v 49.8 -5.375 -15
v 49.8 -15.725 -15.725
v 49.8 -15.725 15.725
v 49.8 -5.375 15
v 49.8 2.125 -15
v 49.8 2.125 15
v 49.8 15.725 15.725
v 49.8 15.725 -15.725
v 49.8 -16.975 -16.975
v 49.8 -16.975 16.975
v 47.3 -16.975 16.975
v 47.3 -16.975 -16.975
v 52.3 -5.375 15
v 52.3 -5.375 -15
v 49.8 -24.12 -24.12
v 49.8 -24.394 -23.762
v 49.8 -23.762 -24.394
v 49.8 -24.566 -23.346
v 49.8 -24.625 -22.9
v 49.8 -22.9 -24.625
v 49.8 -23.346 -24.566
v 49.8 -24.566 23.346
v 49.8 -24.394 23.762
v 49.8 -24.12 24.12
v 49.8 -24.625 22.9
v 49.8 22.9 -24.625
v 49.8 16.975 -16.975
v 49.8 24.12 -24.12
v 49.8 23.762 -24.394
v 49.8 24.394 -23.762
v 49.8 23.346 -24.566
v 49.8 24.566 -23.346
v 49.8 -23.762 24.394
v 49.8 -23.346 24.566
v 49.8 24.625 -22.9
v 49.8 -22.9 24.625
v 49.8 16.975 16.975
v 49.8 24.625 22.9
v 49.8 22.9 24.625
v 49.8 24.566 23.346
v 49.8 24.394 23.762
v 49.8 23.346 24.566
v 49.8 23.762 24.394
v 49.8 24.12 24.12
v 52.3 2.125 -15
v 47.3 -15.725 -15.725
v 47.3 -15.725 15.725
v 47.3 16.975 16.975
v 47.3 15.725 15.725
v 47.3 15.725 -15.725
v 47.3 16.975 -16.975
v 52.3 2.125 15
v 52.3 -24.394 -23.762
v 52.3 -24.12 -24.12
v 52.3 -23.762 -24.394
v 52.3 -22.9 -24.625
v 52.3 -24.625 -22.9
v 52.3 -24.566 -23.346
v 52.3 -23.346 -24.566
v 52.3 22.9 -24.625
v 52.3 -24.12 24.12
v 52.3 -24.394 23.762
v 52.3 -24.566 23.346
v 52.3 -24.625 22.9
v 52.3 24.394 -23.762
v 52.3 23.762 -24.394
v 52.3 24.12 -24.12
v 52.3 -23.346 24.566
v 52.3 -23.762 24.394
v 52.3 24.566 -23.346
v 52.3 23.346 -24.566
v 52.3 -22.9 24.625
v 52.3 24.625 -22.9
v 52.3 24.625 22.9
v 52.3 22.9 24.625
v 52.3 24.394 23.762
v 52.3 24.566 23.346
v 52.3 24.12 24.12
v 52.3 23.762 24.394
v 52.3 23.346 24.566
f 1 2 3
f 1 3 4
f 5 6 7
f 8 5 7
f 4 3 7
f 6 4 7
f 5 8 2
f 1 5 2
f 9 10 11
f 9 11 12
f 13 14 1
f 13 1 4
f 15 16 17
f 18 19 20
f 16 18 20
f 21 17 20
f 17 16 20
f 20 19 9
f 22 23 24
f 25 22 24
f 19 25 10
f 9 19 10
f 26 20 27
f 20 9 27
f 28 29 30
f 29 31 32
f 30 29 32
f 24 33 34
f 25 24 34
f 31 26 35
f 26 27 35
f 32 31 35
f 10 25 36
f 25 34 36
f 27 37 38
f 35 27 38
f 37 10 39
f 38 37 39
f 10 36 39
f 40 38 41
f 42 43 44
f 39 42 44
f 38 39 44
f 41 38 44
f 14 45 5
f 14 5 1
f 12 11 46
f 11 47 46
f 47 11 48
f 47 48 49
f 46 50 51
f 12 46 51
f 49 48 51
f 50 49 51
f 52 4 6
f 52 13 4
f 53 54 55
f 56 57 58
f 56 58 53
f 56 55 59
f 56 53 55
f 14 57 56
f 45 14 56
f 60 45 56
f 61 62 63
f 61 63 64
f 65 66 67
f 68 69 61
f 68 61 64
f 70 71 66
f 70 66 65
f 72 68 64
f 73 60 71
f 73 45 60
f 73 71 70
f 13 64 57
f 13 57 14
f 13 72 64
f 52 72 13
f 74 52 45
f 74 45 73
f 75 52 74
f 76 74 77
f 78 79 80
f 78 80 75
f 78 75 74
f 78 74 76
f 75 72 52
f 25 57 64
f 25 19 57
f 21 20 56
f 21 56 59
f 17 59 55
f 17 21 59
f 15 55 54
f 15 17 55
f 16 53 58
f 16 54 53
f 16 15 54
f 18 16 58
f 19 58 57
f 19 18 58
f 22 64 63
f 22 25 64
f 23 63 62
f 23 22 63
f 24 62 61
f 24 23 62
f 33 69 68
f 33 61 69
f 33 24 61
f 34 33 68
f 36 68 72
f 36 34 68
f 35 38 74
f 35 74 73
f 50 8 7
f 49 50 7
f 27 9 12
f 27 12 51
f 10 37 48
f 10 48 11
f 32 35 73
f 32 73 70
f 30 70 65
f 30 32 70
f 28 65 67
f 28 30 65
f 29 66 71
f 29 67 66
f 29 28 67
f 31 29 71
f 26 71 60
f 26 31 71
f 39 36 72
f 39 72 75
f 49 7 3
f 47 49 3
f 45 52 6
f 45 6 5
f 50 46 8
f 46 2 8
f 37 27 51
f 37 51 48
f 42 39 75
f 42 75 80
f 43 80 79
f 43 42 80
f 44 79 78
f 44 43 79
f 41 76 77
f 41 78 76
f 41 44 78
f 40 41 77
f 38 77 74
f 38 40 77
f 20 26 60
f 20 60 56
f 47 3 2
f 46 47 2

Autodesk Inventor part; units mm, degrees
ref_plane "YZ Plane" through (0, 0, 0) normal (1, 0, 0) x (0, 1, 0)
ref_plane "XZ Plane" through (0, 0, 0) normal (0, 1, 0) x (-1, 0, 0)
sketch "Sketch1" plane through (0, 0, 0) normal (1, 0, 0) x (0, 1, 0)
  spline S0 degree 2 poles (3.4234, 22.1338) (3.5939, 22.0177) (3.7865, 21.6596) (3.7865, 21.4052) knots 0 0 0 1 2 2 2 projected
  spline S1 degree 2 poles (3.7865, 21.4052) (3.7865, 21.2076) (3.6457, 20.8519) (3.5198, 20.7284) knots 0 0 0 1 2 2 2 projected
  spline S2 degree 2 poles (3.5198, 20.7284) (3.3617, 20.5728) (2.9344, 20.4122) (2.6083, 20.4122) knots 0 0 0 1 2 2 2 projected
  line L0 (2.6083, 20.4122) -> (2.265, 20.4122) projected
  line L1 (2.265, 20.4122) -> (2.265, 19.276) projected
  line L2 (2.265, 19.276) -> (1.8599, 19.276) projected
  line L3 (1.8599, 19.276) -> (1.8599, 22.324) projected
  line L4 (1.8599, 22.324) -> (2.6256, 22.324) projected
  spline S3 degree 2 poles (2.6256, 22.324) (2.8973, 22.324) (3.2777, 22.2351) (3.4234, 22.1338) knots 0 0 0 1 2 2 2 projected
  spline S4 degree 2 poles (0.0667, 22.3882) (0.3779, 22.3882) (0.8769, 22.1709) (1.0498, 21.9757) knots 0 0 0 1 2 2 2 projected
  spline S5 degree 2 poles (1.0498, 21.9757) (1.2227, 21.7732) (1.4153, 21.1804) (1.4153, 20.8) knots 0 0 0 1 2 2 2 projected
  spline S6 degree 2 poles (1.4153, 20.8) (1.4153, 20.4295) (1.2276, 19.8293) (1.0498, 19.6267) knots 0 0 0 1 2 2 2 projected
  spline S7 degree 2 poles (1.0498, 19.6267) (0.862, 19.4143) (0.3656, 19.2118) (0.0667, 19.2118) knots 0 0 0 1 2 2 2 projected
  spline S8 degree 2 poles (0.0667, 19.2118) (-0.2421, 19.2118) (-0.7361, 19.4217) (-0.9164, 19.6267) knots 0 0 0 1 2 2 2 projected
  spline S9 degree 2 poles (-0.9164, 19.6267) (-1.0917, 19.8293) (-1.2795, 20.4246) (-1.2795, 20.8) knots 0 0 0 1 2 2 2 projected
  spline S10 degree 2 poles (-1.2795, 20.8) (-1.2795, 21.1829) (-1.0893, 21.7658) (-0.9139, 21.9757) knots 0 0 0 1 2 2 2 projected
  spline S11 degree 2 poles (-0.9139, 21.9757) (-0.7361, 22.1783) (-0.2396, 22.3882) (0.0667, 22.3882) knots 0 0 0 1 2 2 2 projected
  line L5 (-2.4379, 19.276) -> (-2.843, 19.276) projected
  line L6 (-2.843, 19.276) -> (-2.843, 21.9634) projected
  line L7 (-2.843, 21.9634) -> (-3.8656, 21.9634) projected
  line L8 (-3.8656, 21.9634) -> (-3.8656, 22.324) projected
  line L9 (-3.8656, 22.324) -> (-1.4153, 22.324) projected
  line L10 (-1.4153, 22.324) -> (-1.4153, 21.9634) projected
  line L11 (-1.4153, 21.9634) -> (-2.4379, 21.9634) projected
  line L12 (-2.4379, 21.9634) -> (-2.4379, 19.276) projected
  spline S12 degree 2 poles (22.1338, -3.4234) (22.0177, -3.5939) (21.6596, -3.7865) (21.4052, -3.7865) knots 0 0 0 1 2 2 2 projected
  spline S13 degree 2 poles (21.4052, -3.7865) (21.2076, -3.7865) (20.8519, -3.6457) (20.7284, -3.5198) knots 0 0 0 1 2 2 2 projected
  spline S14 degree 2 poles (20.7284, -3.5198) (20.5728, -3.3617) (20.4122, -2.9344) (20.4122, -2.6083) knots 0 0 0 1 2 2 2 projected
  line L13 (20.4122, -2.6083) -> (20.4122, -2.265) projected
  line L14 (20.4122, -2.265) -> (19.276, -2.265) projected
  line L15 (19.276, -2.265) -> (19.276, -1.8599) projected
  line L16 (19.276, -1.8599) -> (22.324, -1.8599) projected
  line L17 (22.324, -1.8599) -> (22.324, -2.6256) projected
  spline S15 degree 2 poles (22.324, -2.6256) (22.324, -2.8973) (22.2351, -3.2777) (22.1338, -3.4234) knots 0 0 0 1 2 2 2 projected
  spline S16 degree 2 poles (22.3882, -0.0667) (22.3882, -0.3779) (22.1709, -0.8769) (21.9757, -1.0498) knots 0 0 0 1 2 2 2 projected
  spline S17 degree 2 poles (21.9757, -1.0498) (21.7732, -1.2227) (21.1804, -1.4153) (20.8, -1.4153) knots 0 0 0 1 2 2 2 projected
  spline S18 degree 2 poles (20.8, -1.4153) (20.4295, -1.4153) (19.8293, -1.2276) (19.6267, -1.0498) knots 0 0 0 1 2 2 2 projected
  spline S19 degree 2 poles (19.6267, -1.0498) (19.4143, -0.862) (19.2118, -0.3656) (19.2118, -0.0667) knots 0 0 0 1 2 2 2 projected
  spline S20 degree 2 poles (19.2118, -0.0667) (19.2118, 0.2421) (19.4217, 0.7361) (19.6267, 0.9164) knots 0 0 0 1 2 2 2 projected
  spline S21 degree 2 poles (19.6267, 0.9164) (19.8293, 1.0917) (20.4246, 1.2795) (20.8, 1.2795) knots 0 0 0 1 2 2 2 projected
  spline S22 degree 2 poles (20.8, 1.2795) (21.1829, 1.2795) (21.7658, 1.0893) (21.9757, 0.9139) knots 0 0 0 1 2 2 2 projected
  spline S23 degree 2 poles (21.9757, 0.9139) (22.1783, 0.7361) (22.3882, 0.2396) (22.3882, -0.0667) knots 0 0 0 1 2 2 2 projected
  line L18 (19.276, 2.4379) -> (19.276, 2.843) projected
  line L19 (19.276, 2.843) -> (21.9634, 2.843) projected
  line L20 (21.9634, 2.843) -> (21.9634, 3.8656) projected
  line L21 (21.9634, 3.8656) -> (22.324, 3.8656) projected
  line L22 (22.324, 3.8656) -> (22.324, 1.4153) projected
  line L23 (22.324, 1.4153) -> (21.9634, 1.4153) projected
  line L24 (21.9634, 1.4153) -> (21.9634, 2.4379) projected
  line L25 (21.9634, 2.4379) -> (19.276, 2.4379) projected
  spline S24 degree 2 poles (-3.4234, -22.1338) (-3.5939, -22.0177) (-3.7865, -21.6596) (-3.7865, -21.4052) knots 0 0 0 1 2 2 2 projected
  spline S25 degree 2 poles (-3.7865, -21.4052) (-3.7865, -21.2076) (-3.6457, -20.8519) (-3.5198, -20.7284) knots 0 0 0 1 2 2 2 projected
  spline S26 degree 2 poles (-3.5198, -20.7284) (-3.3617, -20.5728) (-2.9344, -20.4122) (-2.6083, -20.4122) knots 0 0 0 1 2 2 2 projected
  line L26 (-2.6083, -20.4122) -> (-2.265, -20.4122) projected
  line L27 (-2.265, -20.4122) -> (-2.265, -19.276) projected
  line L28 (-2.265, -19.276) -> (-1.8599, -19.276) projected
  line L29 (-1.8599, -19.276) -> (-1.8599, -22.324) projected
  line L30 (-1.8599, -22.324) -> (-2.6256, -22.324) projected
  spline S27 degree 2 poles (-2.6256, -22.324) (-2.8973, -22.324) (-3.2777, -22.2351) (-3.4234, -22.1338) knots 0 0 0 1 2 2 2 projected
  spline S28 degree 2 poles (-0.0667, -22.3882) (-0.3779, -22.3882) (-0.8769, -22.1709) (-1.0498, -21.9757) knots 0 0 0 1 2 2 2 projected
  spline S29 degree 2 poles (-1.0498, -21.9757) (-1.2227, -21.7732) (-1.4153, -21.1804) (-1.4153, -20.8) knots 0 0 0 1 2 2 2 projected
  spline S30 degree 2 poles (-1.4153, -20.8) (-1.4153, -20.4295) (-1.2276, -19.8293) (-1.0498, -19.6267) knots 0 0 0 1 2 2 2 projected
  spline S31 degree 2 poles (-1.0498, -19.6267) (-0.862, -19.4143) (-0.3656, -19.2118) (-0.0667, -19.2118) knots 0 0 0 1 2 2 2 projected
  spline S32 degree 2 poles (-0.0667, -19.2118) (0.2421, -19.2118) (0.7361, -19.4217) (0.9164, -19.6267) knots 0 0 0 1 2 2 2 projected
  spline S33 degree 2 poles (0.9164, -19.6267) (1.0917, -19.8293) (1.2795, -20.4246) (1.2795, -20.8) knots 0 0 0 1 2 2 2 projected
  spline S34 degree 2 poles (1.2795, -20.8) (1.2795, -21.1829) (1.0893, -21.7658) (0.9139, -21.9757) knots 0 0 0 1 2 2 2 projected
  spline S35 degree 2 poles (0.9139, -21.9757) (0.7361, -22.1783) (0.2396, -22.3882) (-0.0667, -22.3882) knots 0 0 0 1 2 2 2 projected
  line L31 (2.4379, -19.276) -> (2.843, -19.276) projected
  line L32 (2.843, -19.276) -> (2.843, -21.9634) projected
  line L33 (2.843, -21.9634) -> (3.8656, -21.9634) projected
  line L34 (3.8656, -21.9634) -> (3.8656, -22.324) projected
  line L35 (3.8656, -22.324) -> (1.4153, -22.324) projected
  line L36 (1.4153, -22.324) -> (1.4153, -21.9634) projected
  line L37 (1.4153, -21.9634) -> (2.4379, -21.9634) projected
  line L38 (2.4379, -21.9634) -> (2.4379, -19.276) projected
  spline S36 degree 2 poles (-22.1338, 3.4234) (-22.0177, 3.5939) (-21.6596, 3.7865) (-21.4052, 3.7865) knots 0 0 0 1 2 2 2 projected
  spline S37 degree 2 poles (-21.4052, 3.7865) (-21.2076, 3.7865) (-20.8519, 3.6457) (-20.7284, 3.5198) knots 0 0 0 1 2 2 2 projected
  spline S38 degree 2 poles (-20.7284, 3.5198) (-20.5728, 3.3617) (-20.4122, 2.9344) (-20.4122, 2.6083) knots 0 0 0 1 2 2 2 projected
  line L39 (-20.4122, 2.6083) -> (-20.4122, 2.265) projected
  line L40 (-20.4122, 2.265) -> (-19.276, 2.265) projected
  line L41 (-19.276, 2.265) -> (-19.276, 1.8599) projected
  line L42 (-19.276, 1.8599) -> (-22.324, 1.8599) projected
  line L43 (-22.324, 1.8599) -> (-22.324, 2.6256) projected
  spline S39 degree 2 poles (-22.324, 2.6256) (-22.324, 2.8973) (-22.2351, 3.2777) (-22.1338, 3.4234) knots 0 0 0 1 2 2 2 projected
  spline S40 degree 2 poles (-22.3882, 0.0667) (-22.3882, 0.3779) (-22.1709, 0.8769) (-21.9757, 1.0498) knots 0 0 0 1 2 2 2 projected
  spline S41 degree 2 poles (-21.9757, 1.0498) (-21.7732, 1.2227) (-21.1804, 1.4153) (-20.8, 1.4153) knots 0 0 0 1 2 2 2 projected
  spline S42 degree 2 poles (-20.8, 1.4153) (-20.4295, 1.4153) (-19.8293, 1.2276) (-19.6267, 1.0498) knots 0 0 0 1 2 2 2 projected
  spline S43 degree 2 poles (-19.6267, 1.0498) (-19.4143, 0.862) (-19.2118, 0.3656) (-19.2118, 0.0667) knots 0 0 0 1 2 2 2 projected
  spline S44 degree 2 poles (-19.2118, 0.0667) (-19.2118, -0.2421) (-19.4217, -0.7361) (-19.6267, -0.9164) knots 0 0 0 1 2 2 2 projected
  spline S45 degree 2 poles (-19.6267, -0.9164) (-19.8293, -1.0917) (-20.4246, -1.2795) (-20.8, -1.2795) knots 0 0 0 1 2 2 2 projected
  spline S46 degree 2 poles (-20.8, -1.2795) (-21.1829, -1.2795) (-21.7658, -1.0893) (-21.9757, -0.9139) knots 0 0 0 1 2 2 2 projected
  spline S47 degree 2 poles (-21.9757, -0.9139) (-22.1783, -0.7361) (-22.3882, -0.2396) (-22.3882, 0.0667) knots 0 0 0 1 2 2 2 projected
  line L44 (-19.276, -2.4379) -> (-19.276, -2.843) projected
  line L45 (-19.276, -2.843) -> (-21.9634, -2.843) projected
  line L46 (-21.9634, -2.843) -> (-21.9634, -3.8656) projected
  line L47 (-21.9634, -3.8656) -> (-22.324, -3.8656) projected
  line L48 (-22.324, -3.8656) -> (-22.324, -1.4153) projected
  line L49 (-22.324, -1.4153) -> (-21.9634, -1.4153) projected
  line L50 (-21.9634, -1.4153) -> (-21.9634, -2.4379) projected
  line L51 (-21.9634, -2.4379) -> (-19.276, -2.4379) projected
  circle A0 centre (-21.9, 21.9) radius 1.875 projected
  circle A1 centre (21.9, -21.9) radius 1.875 projected
  circle A2 centre (-21.9, -21.9) radius 1.875 projected
  circle A3 centre (21.9, 21.9) radius 1.875 projected
  circle A4 centre (20.8, -14.4) radius 2.0788 projected
  circle A5 centre (-20.8, 14.4) radius 2.0788 projected
  circle A6 centre (-20.8, -14.4) radius 2.0788 projected
  circle A7 centre (-14.4, -20.8) radius 2.0788 projected
  line L52 (17.05, 17.05) -> (-17.05, 17.05) projected
  line L53 (17.05, -17.05) -> (17.05, 17.05) projected
  line L54 (-17.05, -17.05) -> (17.05, -17.05) projected
  line L55 (-17.05, 17.05) -> (-17.05, -17.05) projected
  circle A8 centre (14.4, -20.8) radius 2.0788 projected
  circle A9 centre (20.8, 14.4) radius 2.0788 projected
  circle A10 centre (-14.4, 20.8) radius 2.0788 projected
  circle A11 centre (14.4, 20.8) radius 2.0788 projected
  line L56 (24.875, 22.9) -> (24.875, -22.9) projected
  arc A12 (24.875, 22.9) -> (22.9, 24.875) centre (22.9, 22.9) ccw projected
  line L57 (-22.9, 24.875) -> (22.9, 24.875) projected
  arc A13 (-22.9, 24.875) -> (-24.875, 22.9) centre (-22.9, 22.9) ccw projected
  line L58 (-24.875, -22.9) -> (-24.875, 22.9) projected
  arc A14 (-24.875, -22.9) -> (-22.9, -24.875) centre (-22.9, -22.9) ccw projected
  line L59 (22.9, -24.875) -> (-22.9, -24.875) projected
  arc A15 (22.9, -24.875) -> (24.875, -22.9) centre (22.9, -22.9) ccw projected
  arc A16 (-24.625, -22.9) -> (-22.9, -24.625) centre (-22.9, -22.9) ccw
  line L60 (-24.625, -22.9) -> (-24.625, 22.9)
  arc A17 (-22.9, 24.625) -> (-24.625, 22.9) centre (-22.9, 22.9) ccw
  line L61 (-22.9, 24.625) -> (22.9, 24.625)
  arc A18 (24.625, 22.9) -> (22.9, 24.625) centre (22.9, 22.9) ccw
  line L62 (24.625, 22.9) -> (24.625, -22.9)
  arc A19 (22.9, -24.625) -> (24.625, -22.9) centre (22.9, -22.9) ccw
  line L63 (22.9, -24.625) -> (-22.9, -24.625)
  point P0 (0, 0)
  dimension "d0" = 0.25
ref_plane "Work Plane1" through (49.8, -24.875, -24.875) normal (1, 0, 0) x (0, 1, 0)
extrude "Extrusion1" add sketch "Sketch1" along normal blind 2.5 from surface at 49.8 contours S0 S1 S2 L0 L1 L2 L3 L4 S3 | S4 S5 S6 S7 S8 S9 S10 S11 | L5 L6 L7 L8 L9 L10 L11 L12 | S12 S13 S14 L13 L14 L15 L16 L17 S15 | S16 S17 S18 S19 S20 S21 S22 S23 | L18 L19 L20 L21 L22 L23 L24 L25 | S24 S25 S26 L26 L27 L28 L29 L30 S27 | S28 S29 S30 S31 S32 S33 S34 S35 | L31 L32 L33 L34 L35 L36 L37 L38 | S36 S37 S38 L39 L40 L41 L42 L43 S39 | S40 S41 S42 S43 S44 S45 S46 S47 | L44 L45 L46 L47 L48 L49 L50 L51 | A0 | A1 | A2 | A3 | A4 | A5 | A6 | A7 | L53 L54 L55 L52 | A8 | A9 | A10 | A11 | L60 A17 L61 A18 L62 A19 L63 A16
sketch "Sketch2" plane through (52.3, -22.9, -24.625) normal (1, 0, 0) x (0, 0, -1)
  spline S0 degree 2 poles (-46.7588, 26.3234) (-46.6427, 26.4939) (-46.2846, 26.6865) (-46.0302, 26.6865) knots 0 0 0 1 2 2 2 projected
  spline S1 degree 2 poles (-46.0302, 26.6865) (-45.8326, 26.6865) (-45.4769, 26.5457) (-45.3534, 26.4198) knots 0 0 0 1 2 2 2 projected
  spline S2 degree 2 poles (-45.3534, 26.4198) (-45.1978, 26.2617) (-45.0372, 25.8344) (-45.0372, 25.5083) knots 0 0 0 1 2 2 2 projected
  line L0 (-45.0372, 25.5083) -> (-45.0372, 25.165) projected
  line L1 (-45.0372, 25.165) -> (-43.901, 25.165) projected
  line L2 (-43.901, 25.165) -> (-43.901, 24.7599) projected
  line L3 (-43.901, 24.7599) -> (-46.949, 24.7599) projected
  line L4 (-46.949, 24.7599) -> (-46.949, 25.5256) projected
  spline S3 degree 2 poles (-46.949, 25.5256) (-46.949, 25.7973) (-46.8601, 26.1777) (-46.7588, 26.3234) knots 0 0 0 1 2 2 2 projected
  spline S4 degree 2 poles (-47.0132, 22.9667) (-47.0132, 23.2779) (-46.7959, 23.7769) (-46.6007, 23.9498) knots 0 0 0 1 2 2 2 projected
  spline S5 degree 2 poles (-46.6007, 23.9498) (-46.3982, 24.1227) (-45.8054, 24.3153) (-45.425, 24.3153) knots 0 0 0 1 2 2 2 projected
  spline S6 degree 2 poles (-45.425, 24.3153) (-45.0545, 24.3153) (-44.4543, 24.1276) (-44.2517, 23.9498) knots 0 0 0 1 2 2 2 projected
  spline S7 degree 2 poles (-44.2517, 23.9498) (-44.0393, 23.762) (-43.8368, 23.2656) (-43.8368, 22.9667) knots 0 0 0 1 2 2 2 projected
  spline S8 degree 2 poles (-43.8368, 22.9667) (-43.8368, 22.6579) (-44.0467, 22.1639) (-44.2517, 21.9836) knots 0 0 0 1 2 2 2 projected
  spline S9 degree 2 poles (-44.2517, 21.9836) (-44.4543, 21.8083) (-45.0496, 21.6205) (-45.425, 21.6205) knots 0 0 0 1 2 2 2 projected
  spline S10 degree 2 poles (-45.425, 21.6205) (-45.8079, 21.6205) (-46.3908, 21.8107) (-46.6007, 21.9861) knots 0 0 0 1 2 2 2 projected
  spline S11 degree 2 poles (-46.6007, 21.9861) (-46.8033, 22.1639) (-47.0132, 22.6604) (-47.0132, 22.9667) knots 0 0 0 1 2 2 2 projected
  line L5 (-43.901, 20.4621) -> (-43.901, 20.057) projected
  line L6 (-43.901, 20.057) -> (-46.5884, 20.057) projected
  line L7 (-46.5884, 20.057) -> (-46.5884, 19.0344) projected
  line L8 (-46.5884, 19.0344) -> (-46.949, 19.0344) projected
  line L9 (-46.949, 19.0344) -> (-46.949, 21.4847) projected
  line L10 (-46.949, 21.4847) -> (-46.5884, 21.4847) projected
  line L11 (-46.5884, 21.4847) -> (-46.5884, 20.4621) projected
  line L12 (-46.5884, 20.4621) -> (-43.901, 20.4621) projected
  spline S12 degree 2 poles (-21.2016, 45.0338) (-21.0311, 44.9177) (-20.8385, 44.5596) (-20.8385, 44.3052) knots 0 0 0 1 2 2 2 projected
  spline S13 degree 2 poles (-20.8385, 44.3052) (-20.8385, 44.1076) (-20.9793, 43.7519) (-21.1052, 43.6284) knots 0 0 0 1 2 2 2 projected
  spline S14 degree 2 poles (-21.1052, 43.6284) (-21.2633, 43.4728) (-21.6906, 43.3122) (-22.0167, 43.3122) knots 0 0 0 1 2 2 2 projected
  line L13 (-22.0167, 43.3122) -> (-22.36, 43.3122) projected
  line L14 (-22.36, 43.3122) -> (-22.36, 42.176) projected
  line L15 (-22.36, 42.176) -> (-22.7651, 42.176) projected
  line L16 (-22.7651, 42.176) -> (-22.7651, 45.224) projected
  line L17 (-22.7651, 45.224) -> (-21.9994, 45.224) projected
  spline S15 degree 2 poles (-21.9994, 45.224) (-21.7277, 45.224) (-21.3473, 45.1351) (-21.2016, 45.0338) knots 0 0 0 1 2 2 2 projected
  spline S16 degree 2 poles (-24.5583, 45.2882) (-24.2471, 45.2882) (-23.7481, 45.0709) (-23.5752, 44.8757) knots 0 0 0 1 2 2 2 projected
  spline S17 degree 2 poles (-23.5752, 44.8757) (-23.4023, 44.6732) (-23.2097, 44.0804) (-23.2097, 43.7) knots 0 0 0 1 2 2 2 projected
  spline S18 degree 2 poles (-23.2097, 43.7) (-23.2097, 43.3295) (-23.3974, 42.7293) (-23.5752, 42.5267) knots 0 0 0 1 2 2 2 projected
  spline S19 degree 2 poles (-23.5752, 42.5267) (-23.763, 42.3143) (-24.2594, 42.1118) (-24.5583, 42.1118) knots 0 0 0 1 2 2 2 projected
  spline S20 degree 2 poles (-24.5583, 42.1118) (-24.8671, 42.1118) (-25.3611, 42.3217) (-25.5414, 42.5267) knots 0 0 0 1 2 2 2 projected
  spline S21 degree 2 poles (-25.5414, 42.5267) (-25.7167, 42.7293) (-25.9045, 43.3246) (-25.9045, 43.7) knots 0 0 0 1 2 2 2 projected
  spline S22 degree 2 poles (-25.9045, 43.7) (-25.9045, 44.0829) (-25.7143, 44.6658) (-25.5389, 44.8757) knots 0 0 0 1 2 2 2 projected
  spline S23 degree 2 poles (-25.5389, 44.8757) (-25.3611, 45.0783) (-24.8646, 45.2882) (-24.5583, 45.2882) knots 0 0 0 1 2 2 2 projected
  line L18 (-27.0629, 42.176) -> (-27.468, 42.176) projected
  line L19 (-27.468, 42.176) -> (-27.468, 44.8634) projected
  line L20 (-27.468, 44.8634) -> (-28.4906, 44.8634) projected
  line L21 (-28.4906, 44.8634) -> (-28.4906, 45.224) projected
  line L22 (-28.4906, 45.224) -> (-26.0403, 45.224) projected
  line L23 (-26.0403, 45.224) -> (-26.0403, 44.8634) projected
  line L24 (-26.0403, 44.8634) -> (-27.0629, 44.8634) projected
  line L25 (-27.0629, 44.8634) -> (-27.0629, 42.176) projected
  spline S24 degree 2 poles (-2.4912, 19.4766) (-2.6073, 19.3061) (-2.9654, 19.1135) (-3.2198, 19.1135) knots 0 0 0 1 2 2 2 projected
  spline S25 degree 2 poles (-3.2198, 19.1135) (-3.4174, 19.1135) (-3.7731, 19.2543) (-3.8966, 19.3802) knots 0 0 0 1 2 2 2 projected
  spline S26 degree 2 poles (-3.8966, 19.3802) (-4.0522, 19.5383) (-4.2128, 19.9656) (-4.2128, 20.2917) knots 0 0 0 1 2 2 2 projected
  line L26 (-4.2128, 20.2917) -> (-4.2128, 20.635) projected
  line L27 (-4.2128, 20.635) -> (-5.349, 20.635) projected
  line L28 (-5.349, 20.635) -> (-5.349, 21.0401) projected
  line L29 (-5.349, 21.0401) -> (-2.301, 21.0401) projected
  line L30 (-2.301, 21.0401) -> (-2.301, 20.2744) projected
  spline S27 degree 2 poles (-2.301, 20.2744) (-2.301, 20.0027) (-2.3899, 19.6223) (-2.4912, 19.4766) knots 0 0 0 1 2 2 2 projected
  spline S28 degree 2 poles (-2.2368, 22.8333) (-2.2368, 22.5221) (-2.4541, 22.0231) (-2.6493, 21.8502) knots 0 0 0 1 2 2 2 projected
  spline S29 degree 2 poles (-2.6493, 21.8502) (-2.8518, 21.6773) (-3.4446, 21.4847) (-3.825, 21.4847) knots 0 0 0 1 2 2 2 projected
  spline S30 degree 2 poles (-3.825, 21.4847) (-4.1955, 21.4847) (-4.7957, 21.6724) (-4.9983, 21.8502) knots 0 0 0 1 2 2 2 projected
  spline S31 degree 2 poles (-4.9983, 21.8502) (-5.2107, 22.038) (-5.4132, 22.5344) (-5.4132, 22.8333) knots 0 0 0 1 2 2 2 projected
  spline S32 degree 2 poles (-5.4132, 22.8333) (-5.4132, 23.1421) (-5.2033, 23.6361) (-4.9983, 23.8164) knots 0 0 0 1 2 2 2 projected
  spline S33 degree 2 poles (-4.9983, 23.8164) (-4.7957, 23.9917) (-4.2004, 24.1795) (-3.825, 24.1795) knots 0 0 0 1 2 2 2 projected
  spline S34 degree 2 poles (-3.825, 24.1795) (-3.4421, 24.1795) (-2.8592, 23.9893) (-2.6493, 23.8139) knots 0 0 0 1 2 2 2 projected
  spline S35 degree 2 poles (-2.6493, 23.8139) (-2.4467, 23.6361) (-2.2368, 23.1396) (-2.2368, 22.8333) knots 0 0 0 1 2 2 2 projected
  line L31 (-5.349, 25.3379) -> (-5.349, 25.743) projected
  line L32 (-5.349, 25.743) -> (-2.6616, 25.743) projected
  line L33 (-2.6616, 25.743) -> (-2.6616, 26.7656) projected
  line L34 (-2.6616, 26.7656) -> (-2.301, 26.7656) projected
  line L35 (-2.301, 26.7656) -> (-2.301, 24.3153) projected
  line L36 (-2.301, 24.3153) -> (-2.6616, 24.3153) projected
  line L37 (-2.6616, 24.3153) -> (-2.6616, 25.3379) projected
  line L38 (-2.6616, 25.3379) -> (-5.349, 25.3379) projected
  spline S36 degree 2 poles (-28.0484, 0.7662) (-28.2189, 0.8823) (-28.4115, 1.2404) (-28.4115, 1.4948) knots 0 0 0 1 2 2 2 projected
  spline S37 degree 2 poles (-28.4115, 1.4948) (-28.4115, 1.6924) (-28.2707, 2.0481) (-28.1448, 2.1716) knots 0 0 0 1 2 2 2 projected
  spline S38 degree 2 poles (-28.1448, 2.1716) (-27.9867, 2.3272) (-27.5594, 2.4878) (-27.2333, 2.4878) knots 0 0 0 1 2 2 2 projected
  line L39 (-27.2333, 2.4878) -> (-26.89, 2.4878) projected
  line L40 (-26.89, 2.4878) -> (-26.89, 3.624) projected
  line L41 (-26.89, 3.624) -> (-26.4849, 3.624) projected
  line L42 (-26.4849, 3.624) -> (-26.4849, 0.576) projected
  line L43 (-26.4849, 0.576) -> (-27.2506, 0.576) projected
  spline S39 degree 2 poles (-27.2506, 0.576) (-27.5223, 0.576) (-27.9027, 0.6649) (-28.0484, 0.7662) knots 0 0 0 1 2 2 2 projected
  spline S40 degree 2 poles (-24.6917, 0.5118) (-25.0029, 0.5118) (-25.5019, 0.7291) (-25.6748, 0.9243) knots 0 0 0 1 2 2 2 projected
  spline S41 degree 2 poles (-25.6748, 0.9243) (-25.8477, 1.1268) (-26.0403, 1.7196) (-26.0403, 2.1) knots 0 0 0 1 2 2 2 projected
  spline S42 degree 2 poles (-26.0403, 2.1) (-26.0403, 2.4705) (-25.8526, 3.0707) (-25.6748, 3.2733) knots 0 0 0 1 2 2 2 projected
  spline S43 degree 2 poles (-25.6748, 3.2733) (-25.487, 3.4857) (-24.9906, 3.6882) (-24.6917, 3.6882) knots 0 0 0 1 2 2 2 projected
  spline S44 degree 2 poles (-24.6917, 3.6882) (-24.3829, 3.6882) (-23.8889, 3.4783) (-23.7086, 3.2733) knots 0 0 0 1 2 2 2 projected
  spline S45 degree 2 poles (-23.7086, 3.2733) (-23.5333, 3.0707) (-23.3455, 2.4754) (-23.3455, 2.1) knots 0 0 0 1 2 2 2 projected
  spline S46 degree 2 poles (-23.3455, 2.1) (-23.3455, 1.7171) (-23.5357, 1.1342) (-23.7111, 0.9243) knots 0 0 0 1 2 2 2 projected
  spline S47 degree 2 poles (-23.7111, 0.9243) (-23.8889, 0.7217) (-24.3854, 0.5118) (-24.6917, 0.5118) knots 0 0 0 1 2 2 2 projected
  line L44 (-22.1871, 3.624) -> (-21.782, 3.624) projected
  line L45 (-21.782, 3.624) -> (-21.782, 0.9366) projected
  line L46 (-21.782, 0.9366) -> (-20.7594, 0.9366) projected
  line L47 (-20.7594, 0.9366) -> (-20.7594, 0.576) projected
  line L48 (-20.7594, 0.576) -> (-23.2097, 0.576) projected
  line L49 (-23.2097, 0.576) -> (-23.2097, 0.9366) projected
  line L50 (-23.2097, 0.9366) -> (-22.1871, 0.9366) projected
  line L51 (-22.1871, 0.9366) -> (-22.1871, 3.624) projected
  circle A0 centre (-46.525, 1) radius 1.875 projected
  circle A1 centre (-2.725, 44.8) radius 1.875 projected
  circle A2 centre (-2.725, 1) radius 1.875 projected
  circle A3 centre (-46.525, 44.8) radius 1.875 projected
  circle A4 centre (-10.225, 43.7) radius 2.0788 projected
  circle A5 centre (-39.025, 2.1) radius 2.0788 projected
  circle A6 centre (-10.225, 2.1) radius 2.0788 projected
  circle A7 centre (-3.825, 8.5) radius 2.0788 projected
  line L52 (-41.675, 39.95) -> (-41.675, 5.85) projected
  line L53 (-7.575, 39.95) -> (-41.675, 39.95) projected
  line L54 (-7.575, 5.85) -> (-7.575, 39.95) projected
  line L55 (-41.675, 5.85) -> (-7.575, 5.85) projected
  circle A8 centre (-3.825, 37.3) radius 2.0788 projected
  circle A9 centre (-39.025, 43.7) radius 2.0788 projected
  circle A10 centre (-45.425, 8.5) radius 2.0788 projected
  circle A11 centre (-45.425, 37.3) radius 2.0788 projected
  line L56 (-47.525, 47.775) -> (-1.725, 47.775) projected
  arc A12 (-47.525, 47.775) -> (-49.5, 45.8) centre (-47.525, 45.8) ccw projected
  line L57 (-49.5, 0) -> (-49.5, 45.8) projected
  arc A13 (-49.5, 0) -> (-47.525, -1.975) centre (-47.525, 0) ccw projected
  line L58 (-1.725, -1.975) -> (-47.525, -1.975) projected
  arc A14 (-1.725, -1.975) -> (0.25, 0) centre (-1.725, 0) ccw projected
  line L59 (0.25, 45.8) -> (0.25, 0) projected
  arc A15 (0.25, 45.8) -> (-1.725, 47.775) centre (-1.725, 45.8) ccw projected
  circle A16 centre (-2.725, 44.8) radius 1.8
  circle A17 centre (-2.725, 1) radius 1.8
  circle A18 centre (-46.525, 1) radius 1.8
  circle A19 centre (-46.525, 44.8) radius 1.8
  line L60 (-7.65, 39.875) -> (-41.6, 39.875)
  line L61 (-41.6, 39.875) -> (-41.6, 5.925)
  line L62 (-41.6, 5.925) -> (-7.65, 5.925)
  line L63 (-7.65, 5.925) -> (-7.65, 39.875)
  line L64 (-8.9, 38.625) -> (-40.35, 38.625)
  line L65 (-40.35, 38.625) -> (-40.35, 7.175)
  line L66 (-40.35, 7.175) -> (-8.9, 7.175)
  line L67 (-8.9, 7.175) -> (-8.9, 38.625)
  point P0 (-24.625, 22.9)
  dimension "d3" = 0.075
  dimension "d4" = 0.075
  dimension "d5" = 0.075
  dimension "d6" = 0.075
  dimension "d20" = 0.075
  dimension "d21" = 1.25
extrude "Extrusion2" add sketch "Sketch2" against normal blind 2.5 from surface at -2.5 contours L63 L62 L61 L60
sketch "Sketch3" plane through (52.3, -22.9, -24.625) normal (1, 0, 0) x (0, 0, -1)
  arc A0 (-49.25, 0) -> (-47.525, -1.725) centre (-47.525, 0) ccw projected
  line L0 (-1.725, -1.725) -> (-47.525, -1.725) projected
  arc A1 (-1.725, -1.725) -> (0, 0) centre (-1.725, 0) ccw projected
  line L1 (0, 45.8) -> (0, 0) projected
  arc A2 (0, 45.8) -> (-1.725, 47.525) centre (-1.725, 45.8) ccw projected
  line L2 (-47.525, 47.525) -> (-1.725, 47.525) projected
  arc A3 (-47.525, 47.525) -> (-49.25, 45.8) centre (-47.525, 45.8) ccw projected
  line L3 (-49.25, 0) -> (-49.25, 45.8) projected
  line L4 (-24.625, -1.725) -> (-24.625, 21.275)
  line L5 (-39.625, 25.025) -> (-9.625, 25.025)
  line L6 (-9.625, 25.025) -> (-9.625, 17.525)
  line L7 (-9.625, 17.525) -> (-39.625, 17.525)
  line L8 (-39.625, 17.525) -> (-39.625, 25.025)
  line L9 (-39.625, 25.025) -> (-9.625, 17.525) construction
  line L10 (-9.625, 25.025) -> (-39.625, 17.525) construction
  point P0 (-24.625, 22.9)
  dimension "d12" = 23
  dimension "d13" = 30
  dimension "d14" = 7.5
extrude "Extrusion3" cut sketch "Sketch3" against normal up to surface (2.5 mm away) contours L7 L8 L5 L6
properties part number "Cover Top (Slotted) Proto"
